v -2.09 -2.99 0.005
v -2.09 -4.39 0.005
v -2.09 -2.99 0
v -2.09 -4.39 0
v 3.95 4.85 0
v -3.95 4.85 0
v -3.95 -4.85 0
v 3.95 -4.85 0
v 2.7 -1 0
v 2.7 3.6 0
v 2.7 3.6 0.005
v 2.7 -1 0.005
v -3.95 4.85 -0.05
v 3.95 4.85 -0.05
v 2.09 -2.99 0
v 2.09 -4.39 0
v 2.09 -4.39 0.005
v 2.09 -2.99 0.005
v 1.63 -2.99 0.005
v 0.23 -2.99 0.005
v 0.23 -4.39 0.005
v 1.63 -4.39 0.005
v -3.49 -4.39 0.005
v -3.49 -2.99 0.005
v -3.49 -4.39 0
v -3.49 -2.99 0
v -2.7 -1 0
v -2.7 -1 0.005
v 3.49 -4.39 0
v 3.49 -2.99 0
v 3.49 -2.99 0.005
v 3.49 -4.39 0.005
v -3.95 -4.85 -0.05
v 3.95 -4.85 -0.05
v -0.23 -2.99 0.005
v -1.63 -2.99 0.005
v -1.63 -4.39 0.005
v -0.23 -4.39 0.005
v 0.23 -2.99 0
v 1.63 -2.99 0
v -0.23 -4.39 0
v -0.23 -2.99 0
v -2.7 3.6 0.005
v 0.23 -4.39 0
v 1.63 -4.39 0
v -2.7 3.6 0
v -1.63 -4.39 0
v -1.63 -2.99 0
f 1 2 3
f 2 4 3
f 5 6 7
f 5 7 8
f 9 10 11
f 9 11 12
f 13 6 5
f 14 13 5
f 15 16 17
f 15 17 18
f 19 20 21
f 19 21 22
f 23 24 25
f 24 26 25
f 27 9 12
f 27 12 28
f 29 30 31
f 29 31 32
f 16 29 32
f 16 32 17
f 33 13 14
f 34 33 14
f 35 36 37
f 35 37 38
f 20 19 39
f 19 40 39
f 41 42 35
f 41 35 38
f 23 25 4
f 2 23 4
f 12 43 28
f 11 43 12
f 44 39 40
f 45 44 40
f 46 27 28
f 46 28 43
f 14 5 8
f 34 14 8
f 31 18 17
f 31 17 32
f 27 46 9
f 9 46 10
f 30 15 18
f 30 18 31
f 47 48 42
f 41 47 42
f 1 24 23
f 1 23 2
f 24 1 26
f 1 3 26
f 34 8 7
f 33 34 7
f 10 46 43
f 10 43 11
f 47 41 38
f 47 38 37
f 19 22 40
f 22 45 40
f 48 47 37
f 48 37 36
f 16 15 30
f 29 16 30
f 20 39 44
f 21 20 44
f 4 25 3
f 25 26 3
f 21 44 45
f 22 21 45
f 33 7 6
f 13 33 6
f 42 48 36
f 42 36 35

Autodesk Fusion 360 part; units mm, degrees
sketch "Sketch1" plane through (0, 0, 0) normal (0, 0, 1) x (1, 0, 0) in component "Bx-350-3EB"
  line L0 (3.95, -4.85) -> (-3.95, -4.85)
  line L1 (-3.95, -4.85) -> (-3.95, 4.85)
  line L2 (-3.95, 4.85) -> (3.95, 4.85)
  line L3 (3.95, 4.85) -> (3.95, -4.85)
  line L4 (3.95, -4.85) -> (-3.95, 4.85) construction
  line L5 (-3.95, -4.85) -> (3.95, 4.85) construction
  line L6 (0, 0) -> (0, 1.3)
  line L7 (2.7, -1) -> (-2.7, -1)
  line L8 (-2.7, -1) -> (-2.7, 3.6)
  line L9 (-2.7, 3.6) -> (2.7, 3.6)
  line L10 (2.7, 3.6) -> (2.7, -1)
  line L11 (2.7, -1) -> (-2.7, 3.6) construction
  line L12 (-2.7, -1) -> (2.7, 3.6) construction
  line L13 (-3.49, -4.39) -> (-2.09, -4.39)
  line L14 (-2.09, -4.39) -> (-2.09, -2.99)
  line L15 (-2.09, -2.99) -> (-3.49, -2.99)
  line L16 (-3.49, -2.99) -> (-3.49, -4.39)
  line L17 (-1.63, -2.99) -> (-0.23, -2.99)
  line L18 (-0.23, -2.99) -> (-0.23, -4.39)
  line L19 (-0.23, -4.39) -> (-1.63, -4.39)
  line L20 (-1.63, -4.39) -> (-1.63, -2.99)
  line L21 (3.49, -2.99) -> (3.49, -4.39)
  line L22 (3.49, -4.39) -> (2.09, -4.39)
  line L23 (2.09, -4.39) -> (2.09, -2.99)
  line L24 (2.09, -2.99) -> (3.49, -2.99)
  line L25 (0.23, -2.99) -> (0.23, -4.39)
  line L26 (0.23, -4.39) -> (1.63, -4.39)
  line L27 (1.63, -2.99) -> (0.23, -2.99)
  line L28 (1.63, -4.39) -> (1.63, -2.99)
  point P0 (0, 1.3)
  dimension "d1" = 7.9
  dimension "d2" = 9.7
  dimension "d5" = 5.4
  dimension "d6" = 4.6
  dimension "d7" = 1.25
  dimension "d9" = 1.4
  dimension "d10" = 1.4
  dimension "d11" = 1.4
  dimension "d12" = 1.4
  dimension "d13" = 1.4
  dimension "d14" = 1.4
  dimension "d15" = 1.4
  dimension "d16" = 1.4
  dimension "d17" = 0.46
  dimension "d18" = 0.46
  dimension "d19" = 0.46
  dimension "d20" = 0.46
  dimension "d21" = 0.46
  dimension "d26" = 1.25
  dimension "d27" = 0.46
extrude "Extrude1" add sketch "Sketch1" against normal blind 0.05 contours L0 L1 L2 L3 | L7 L8 L9 L10 | L13 L14 L15 L16 | L17 L18 L19 L20 | L21 L22 L23 L24 | L25 L26 L27 L28 makes body 1 in component "Bx-350-3EB"
extrude "Extrude2" add sketch "Sketch1" along normal blind 0.005 separate body contours L7 L8 L9 L10 | L13 L14 L15 L16 | L17 L18 L19 L20 | L21 L22 L23 L24 | L25 L26 L27 L28 makes body 2 at (-0.9, 2.0667, 0) makes body 3 at (-3.0233, -3.4567, 0) makes body 4 at (0.6967, -3.9233, 0) makes body 5 at (-1.1633, -3.4567, 0) makes body 6 at (3.0233, -3.4567, 0) in component "Bx-350-3EB"
component "Bx-350-3EB" placed x (1, 0, 0) y (0, 1, 0) z (0, 0, 1) at (0, 0, 0)
equation "d5 = ( 2.7 * 2 ) * 1 mm"
equation "d6 = ( 2.3 * 2 ) * 1 mm"
equation "d17 = ( ( 7.9 - ( 1.4 * 4 ) ) / 5 ) * 1 mm"
equation "d18 = ( ( 7.9 - ( 1.4 * 4 ) ) / 5 ) * 1 mm"
equation "d19 = ( ( 7.9 - ( 1.4 * 4 ) ) / 5 ) * 1 mm"
equation "d20 = ( ( 7.9 - ( 1.4 * 4 ) ) / 5 ) * 1 mm"
equation "d21 = ( ( 7.9 - ( 1.4 * 4 ) ) / 5 ) * 1 mm"
